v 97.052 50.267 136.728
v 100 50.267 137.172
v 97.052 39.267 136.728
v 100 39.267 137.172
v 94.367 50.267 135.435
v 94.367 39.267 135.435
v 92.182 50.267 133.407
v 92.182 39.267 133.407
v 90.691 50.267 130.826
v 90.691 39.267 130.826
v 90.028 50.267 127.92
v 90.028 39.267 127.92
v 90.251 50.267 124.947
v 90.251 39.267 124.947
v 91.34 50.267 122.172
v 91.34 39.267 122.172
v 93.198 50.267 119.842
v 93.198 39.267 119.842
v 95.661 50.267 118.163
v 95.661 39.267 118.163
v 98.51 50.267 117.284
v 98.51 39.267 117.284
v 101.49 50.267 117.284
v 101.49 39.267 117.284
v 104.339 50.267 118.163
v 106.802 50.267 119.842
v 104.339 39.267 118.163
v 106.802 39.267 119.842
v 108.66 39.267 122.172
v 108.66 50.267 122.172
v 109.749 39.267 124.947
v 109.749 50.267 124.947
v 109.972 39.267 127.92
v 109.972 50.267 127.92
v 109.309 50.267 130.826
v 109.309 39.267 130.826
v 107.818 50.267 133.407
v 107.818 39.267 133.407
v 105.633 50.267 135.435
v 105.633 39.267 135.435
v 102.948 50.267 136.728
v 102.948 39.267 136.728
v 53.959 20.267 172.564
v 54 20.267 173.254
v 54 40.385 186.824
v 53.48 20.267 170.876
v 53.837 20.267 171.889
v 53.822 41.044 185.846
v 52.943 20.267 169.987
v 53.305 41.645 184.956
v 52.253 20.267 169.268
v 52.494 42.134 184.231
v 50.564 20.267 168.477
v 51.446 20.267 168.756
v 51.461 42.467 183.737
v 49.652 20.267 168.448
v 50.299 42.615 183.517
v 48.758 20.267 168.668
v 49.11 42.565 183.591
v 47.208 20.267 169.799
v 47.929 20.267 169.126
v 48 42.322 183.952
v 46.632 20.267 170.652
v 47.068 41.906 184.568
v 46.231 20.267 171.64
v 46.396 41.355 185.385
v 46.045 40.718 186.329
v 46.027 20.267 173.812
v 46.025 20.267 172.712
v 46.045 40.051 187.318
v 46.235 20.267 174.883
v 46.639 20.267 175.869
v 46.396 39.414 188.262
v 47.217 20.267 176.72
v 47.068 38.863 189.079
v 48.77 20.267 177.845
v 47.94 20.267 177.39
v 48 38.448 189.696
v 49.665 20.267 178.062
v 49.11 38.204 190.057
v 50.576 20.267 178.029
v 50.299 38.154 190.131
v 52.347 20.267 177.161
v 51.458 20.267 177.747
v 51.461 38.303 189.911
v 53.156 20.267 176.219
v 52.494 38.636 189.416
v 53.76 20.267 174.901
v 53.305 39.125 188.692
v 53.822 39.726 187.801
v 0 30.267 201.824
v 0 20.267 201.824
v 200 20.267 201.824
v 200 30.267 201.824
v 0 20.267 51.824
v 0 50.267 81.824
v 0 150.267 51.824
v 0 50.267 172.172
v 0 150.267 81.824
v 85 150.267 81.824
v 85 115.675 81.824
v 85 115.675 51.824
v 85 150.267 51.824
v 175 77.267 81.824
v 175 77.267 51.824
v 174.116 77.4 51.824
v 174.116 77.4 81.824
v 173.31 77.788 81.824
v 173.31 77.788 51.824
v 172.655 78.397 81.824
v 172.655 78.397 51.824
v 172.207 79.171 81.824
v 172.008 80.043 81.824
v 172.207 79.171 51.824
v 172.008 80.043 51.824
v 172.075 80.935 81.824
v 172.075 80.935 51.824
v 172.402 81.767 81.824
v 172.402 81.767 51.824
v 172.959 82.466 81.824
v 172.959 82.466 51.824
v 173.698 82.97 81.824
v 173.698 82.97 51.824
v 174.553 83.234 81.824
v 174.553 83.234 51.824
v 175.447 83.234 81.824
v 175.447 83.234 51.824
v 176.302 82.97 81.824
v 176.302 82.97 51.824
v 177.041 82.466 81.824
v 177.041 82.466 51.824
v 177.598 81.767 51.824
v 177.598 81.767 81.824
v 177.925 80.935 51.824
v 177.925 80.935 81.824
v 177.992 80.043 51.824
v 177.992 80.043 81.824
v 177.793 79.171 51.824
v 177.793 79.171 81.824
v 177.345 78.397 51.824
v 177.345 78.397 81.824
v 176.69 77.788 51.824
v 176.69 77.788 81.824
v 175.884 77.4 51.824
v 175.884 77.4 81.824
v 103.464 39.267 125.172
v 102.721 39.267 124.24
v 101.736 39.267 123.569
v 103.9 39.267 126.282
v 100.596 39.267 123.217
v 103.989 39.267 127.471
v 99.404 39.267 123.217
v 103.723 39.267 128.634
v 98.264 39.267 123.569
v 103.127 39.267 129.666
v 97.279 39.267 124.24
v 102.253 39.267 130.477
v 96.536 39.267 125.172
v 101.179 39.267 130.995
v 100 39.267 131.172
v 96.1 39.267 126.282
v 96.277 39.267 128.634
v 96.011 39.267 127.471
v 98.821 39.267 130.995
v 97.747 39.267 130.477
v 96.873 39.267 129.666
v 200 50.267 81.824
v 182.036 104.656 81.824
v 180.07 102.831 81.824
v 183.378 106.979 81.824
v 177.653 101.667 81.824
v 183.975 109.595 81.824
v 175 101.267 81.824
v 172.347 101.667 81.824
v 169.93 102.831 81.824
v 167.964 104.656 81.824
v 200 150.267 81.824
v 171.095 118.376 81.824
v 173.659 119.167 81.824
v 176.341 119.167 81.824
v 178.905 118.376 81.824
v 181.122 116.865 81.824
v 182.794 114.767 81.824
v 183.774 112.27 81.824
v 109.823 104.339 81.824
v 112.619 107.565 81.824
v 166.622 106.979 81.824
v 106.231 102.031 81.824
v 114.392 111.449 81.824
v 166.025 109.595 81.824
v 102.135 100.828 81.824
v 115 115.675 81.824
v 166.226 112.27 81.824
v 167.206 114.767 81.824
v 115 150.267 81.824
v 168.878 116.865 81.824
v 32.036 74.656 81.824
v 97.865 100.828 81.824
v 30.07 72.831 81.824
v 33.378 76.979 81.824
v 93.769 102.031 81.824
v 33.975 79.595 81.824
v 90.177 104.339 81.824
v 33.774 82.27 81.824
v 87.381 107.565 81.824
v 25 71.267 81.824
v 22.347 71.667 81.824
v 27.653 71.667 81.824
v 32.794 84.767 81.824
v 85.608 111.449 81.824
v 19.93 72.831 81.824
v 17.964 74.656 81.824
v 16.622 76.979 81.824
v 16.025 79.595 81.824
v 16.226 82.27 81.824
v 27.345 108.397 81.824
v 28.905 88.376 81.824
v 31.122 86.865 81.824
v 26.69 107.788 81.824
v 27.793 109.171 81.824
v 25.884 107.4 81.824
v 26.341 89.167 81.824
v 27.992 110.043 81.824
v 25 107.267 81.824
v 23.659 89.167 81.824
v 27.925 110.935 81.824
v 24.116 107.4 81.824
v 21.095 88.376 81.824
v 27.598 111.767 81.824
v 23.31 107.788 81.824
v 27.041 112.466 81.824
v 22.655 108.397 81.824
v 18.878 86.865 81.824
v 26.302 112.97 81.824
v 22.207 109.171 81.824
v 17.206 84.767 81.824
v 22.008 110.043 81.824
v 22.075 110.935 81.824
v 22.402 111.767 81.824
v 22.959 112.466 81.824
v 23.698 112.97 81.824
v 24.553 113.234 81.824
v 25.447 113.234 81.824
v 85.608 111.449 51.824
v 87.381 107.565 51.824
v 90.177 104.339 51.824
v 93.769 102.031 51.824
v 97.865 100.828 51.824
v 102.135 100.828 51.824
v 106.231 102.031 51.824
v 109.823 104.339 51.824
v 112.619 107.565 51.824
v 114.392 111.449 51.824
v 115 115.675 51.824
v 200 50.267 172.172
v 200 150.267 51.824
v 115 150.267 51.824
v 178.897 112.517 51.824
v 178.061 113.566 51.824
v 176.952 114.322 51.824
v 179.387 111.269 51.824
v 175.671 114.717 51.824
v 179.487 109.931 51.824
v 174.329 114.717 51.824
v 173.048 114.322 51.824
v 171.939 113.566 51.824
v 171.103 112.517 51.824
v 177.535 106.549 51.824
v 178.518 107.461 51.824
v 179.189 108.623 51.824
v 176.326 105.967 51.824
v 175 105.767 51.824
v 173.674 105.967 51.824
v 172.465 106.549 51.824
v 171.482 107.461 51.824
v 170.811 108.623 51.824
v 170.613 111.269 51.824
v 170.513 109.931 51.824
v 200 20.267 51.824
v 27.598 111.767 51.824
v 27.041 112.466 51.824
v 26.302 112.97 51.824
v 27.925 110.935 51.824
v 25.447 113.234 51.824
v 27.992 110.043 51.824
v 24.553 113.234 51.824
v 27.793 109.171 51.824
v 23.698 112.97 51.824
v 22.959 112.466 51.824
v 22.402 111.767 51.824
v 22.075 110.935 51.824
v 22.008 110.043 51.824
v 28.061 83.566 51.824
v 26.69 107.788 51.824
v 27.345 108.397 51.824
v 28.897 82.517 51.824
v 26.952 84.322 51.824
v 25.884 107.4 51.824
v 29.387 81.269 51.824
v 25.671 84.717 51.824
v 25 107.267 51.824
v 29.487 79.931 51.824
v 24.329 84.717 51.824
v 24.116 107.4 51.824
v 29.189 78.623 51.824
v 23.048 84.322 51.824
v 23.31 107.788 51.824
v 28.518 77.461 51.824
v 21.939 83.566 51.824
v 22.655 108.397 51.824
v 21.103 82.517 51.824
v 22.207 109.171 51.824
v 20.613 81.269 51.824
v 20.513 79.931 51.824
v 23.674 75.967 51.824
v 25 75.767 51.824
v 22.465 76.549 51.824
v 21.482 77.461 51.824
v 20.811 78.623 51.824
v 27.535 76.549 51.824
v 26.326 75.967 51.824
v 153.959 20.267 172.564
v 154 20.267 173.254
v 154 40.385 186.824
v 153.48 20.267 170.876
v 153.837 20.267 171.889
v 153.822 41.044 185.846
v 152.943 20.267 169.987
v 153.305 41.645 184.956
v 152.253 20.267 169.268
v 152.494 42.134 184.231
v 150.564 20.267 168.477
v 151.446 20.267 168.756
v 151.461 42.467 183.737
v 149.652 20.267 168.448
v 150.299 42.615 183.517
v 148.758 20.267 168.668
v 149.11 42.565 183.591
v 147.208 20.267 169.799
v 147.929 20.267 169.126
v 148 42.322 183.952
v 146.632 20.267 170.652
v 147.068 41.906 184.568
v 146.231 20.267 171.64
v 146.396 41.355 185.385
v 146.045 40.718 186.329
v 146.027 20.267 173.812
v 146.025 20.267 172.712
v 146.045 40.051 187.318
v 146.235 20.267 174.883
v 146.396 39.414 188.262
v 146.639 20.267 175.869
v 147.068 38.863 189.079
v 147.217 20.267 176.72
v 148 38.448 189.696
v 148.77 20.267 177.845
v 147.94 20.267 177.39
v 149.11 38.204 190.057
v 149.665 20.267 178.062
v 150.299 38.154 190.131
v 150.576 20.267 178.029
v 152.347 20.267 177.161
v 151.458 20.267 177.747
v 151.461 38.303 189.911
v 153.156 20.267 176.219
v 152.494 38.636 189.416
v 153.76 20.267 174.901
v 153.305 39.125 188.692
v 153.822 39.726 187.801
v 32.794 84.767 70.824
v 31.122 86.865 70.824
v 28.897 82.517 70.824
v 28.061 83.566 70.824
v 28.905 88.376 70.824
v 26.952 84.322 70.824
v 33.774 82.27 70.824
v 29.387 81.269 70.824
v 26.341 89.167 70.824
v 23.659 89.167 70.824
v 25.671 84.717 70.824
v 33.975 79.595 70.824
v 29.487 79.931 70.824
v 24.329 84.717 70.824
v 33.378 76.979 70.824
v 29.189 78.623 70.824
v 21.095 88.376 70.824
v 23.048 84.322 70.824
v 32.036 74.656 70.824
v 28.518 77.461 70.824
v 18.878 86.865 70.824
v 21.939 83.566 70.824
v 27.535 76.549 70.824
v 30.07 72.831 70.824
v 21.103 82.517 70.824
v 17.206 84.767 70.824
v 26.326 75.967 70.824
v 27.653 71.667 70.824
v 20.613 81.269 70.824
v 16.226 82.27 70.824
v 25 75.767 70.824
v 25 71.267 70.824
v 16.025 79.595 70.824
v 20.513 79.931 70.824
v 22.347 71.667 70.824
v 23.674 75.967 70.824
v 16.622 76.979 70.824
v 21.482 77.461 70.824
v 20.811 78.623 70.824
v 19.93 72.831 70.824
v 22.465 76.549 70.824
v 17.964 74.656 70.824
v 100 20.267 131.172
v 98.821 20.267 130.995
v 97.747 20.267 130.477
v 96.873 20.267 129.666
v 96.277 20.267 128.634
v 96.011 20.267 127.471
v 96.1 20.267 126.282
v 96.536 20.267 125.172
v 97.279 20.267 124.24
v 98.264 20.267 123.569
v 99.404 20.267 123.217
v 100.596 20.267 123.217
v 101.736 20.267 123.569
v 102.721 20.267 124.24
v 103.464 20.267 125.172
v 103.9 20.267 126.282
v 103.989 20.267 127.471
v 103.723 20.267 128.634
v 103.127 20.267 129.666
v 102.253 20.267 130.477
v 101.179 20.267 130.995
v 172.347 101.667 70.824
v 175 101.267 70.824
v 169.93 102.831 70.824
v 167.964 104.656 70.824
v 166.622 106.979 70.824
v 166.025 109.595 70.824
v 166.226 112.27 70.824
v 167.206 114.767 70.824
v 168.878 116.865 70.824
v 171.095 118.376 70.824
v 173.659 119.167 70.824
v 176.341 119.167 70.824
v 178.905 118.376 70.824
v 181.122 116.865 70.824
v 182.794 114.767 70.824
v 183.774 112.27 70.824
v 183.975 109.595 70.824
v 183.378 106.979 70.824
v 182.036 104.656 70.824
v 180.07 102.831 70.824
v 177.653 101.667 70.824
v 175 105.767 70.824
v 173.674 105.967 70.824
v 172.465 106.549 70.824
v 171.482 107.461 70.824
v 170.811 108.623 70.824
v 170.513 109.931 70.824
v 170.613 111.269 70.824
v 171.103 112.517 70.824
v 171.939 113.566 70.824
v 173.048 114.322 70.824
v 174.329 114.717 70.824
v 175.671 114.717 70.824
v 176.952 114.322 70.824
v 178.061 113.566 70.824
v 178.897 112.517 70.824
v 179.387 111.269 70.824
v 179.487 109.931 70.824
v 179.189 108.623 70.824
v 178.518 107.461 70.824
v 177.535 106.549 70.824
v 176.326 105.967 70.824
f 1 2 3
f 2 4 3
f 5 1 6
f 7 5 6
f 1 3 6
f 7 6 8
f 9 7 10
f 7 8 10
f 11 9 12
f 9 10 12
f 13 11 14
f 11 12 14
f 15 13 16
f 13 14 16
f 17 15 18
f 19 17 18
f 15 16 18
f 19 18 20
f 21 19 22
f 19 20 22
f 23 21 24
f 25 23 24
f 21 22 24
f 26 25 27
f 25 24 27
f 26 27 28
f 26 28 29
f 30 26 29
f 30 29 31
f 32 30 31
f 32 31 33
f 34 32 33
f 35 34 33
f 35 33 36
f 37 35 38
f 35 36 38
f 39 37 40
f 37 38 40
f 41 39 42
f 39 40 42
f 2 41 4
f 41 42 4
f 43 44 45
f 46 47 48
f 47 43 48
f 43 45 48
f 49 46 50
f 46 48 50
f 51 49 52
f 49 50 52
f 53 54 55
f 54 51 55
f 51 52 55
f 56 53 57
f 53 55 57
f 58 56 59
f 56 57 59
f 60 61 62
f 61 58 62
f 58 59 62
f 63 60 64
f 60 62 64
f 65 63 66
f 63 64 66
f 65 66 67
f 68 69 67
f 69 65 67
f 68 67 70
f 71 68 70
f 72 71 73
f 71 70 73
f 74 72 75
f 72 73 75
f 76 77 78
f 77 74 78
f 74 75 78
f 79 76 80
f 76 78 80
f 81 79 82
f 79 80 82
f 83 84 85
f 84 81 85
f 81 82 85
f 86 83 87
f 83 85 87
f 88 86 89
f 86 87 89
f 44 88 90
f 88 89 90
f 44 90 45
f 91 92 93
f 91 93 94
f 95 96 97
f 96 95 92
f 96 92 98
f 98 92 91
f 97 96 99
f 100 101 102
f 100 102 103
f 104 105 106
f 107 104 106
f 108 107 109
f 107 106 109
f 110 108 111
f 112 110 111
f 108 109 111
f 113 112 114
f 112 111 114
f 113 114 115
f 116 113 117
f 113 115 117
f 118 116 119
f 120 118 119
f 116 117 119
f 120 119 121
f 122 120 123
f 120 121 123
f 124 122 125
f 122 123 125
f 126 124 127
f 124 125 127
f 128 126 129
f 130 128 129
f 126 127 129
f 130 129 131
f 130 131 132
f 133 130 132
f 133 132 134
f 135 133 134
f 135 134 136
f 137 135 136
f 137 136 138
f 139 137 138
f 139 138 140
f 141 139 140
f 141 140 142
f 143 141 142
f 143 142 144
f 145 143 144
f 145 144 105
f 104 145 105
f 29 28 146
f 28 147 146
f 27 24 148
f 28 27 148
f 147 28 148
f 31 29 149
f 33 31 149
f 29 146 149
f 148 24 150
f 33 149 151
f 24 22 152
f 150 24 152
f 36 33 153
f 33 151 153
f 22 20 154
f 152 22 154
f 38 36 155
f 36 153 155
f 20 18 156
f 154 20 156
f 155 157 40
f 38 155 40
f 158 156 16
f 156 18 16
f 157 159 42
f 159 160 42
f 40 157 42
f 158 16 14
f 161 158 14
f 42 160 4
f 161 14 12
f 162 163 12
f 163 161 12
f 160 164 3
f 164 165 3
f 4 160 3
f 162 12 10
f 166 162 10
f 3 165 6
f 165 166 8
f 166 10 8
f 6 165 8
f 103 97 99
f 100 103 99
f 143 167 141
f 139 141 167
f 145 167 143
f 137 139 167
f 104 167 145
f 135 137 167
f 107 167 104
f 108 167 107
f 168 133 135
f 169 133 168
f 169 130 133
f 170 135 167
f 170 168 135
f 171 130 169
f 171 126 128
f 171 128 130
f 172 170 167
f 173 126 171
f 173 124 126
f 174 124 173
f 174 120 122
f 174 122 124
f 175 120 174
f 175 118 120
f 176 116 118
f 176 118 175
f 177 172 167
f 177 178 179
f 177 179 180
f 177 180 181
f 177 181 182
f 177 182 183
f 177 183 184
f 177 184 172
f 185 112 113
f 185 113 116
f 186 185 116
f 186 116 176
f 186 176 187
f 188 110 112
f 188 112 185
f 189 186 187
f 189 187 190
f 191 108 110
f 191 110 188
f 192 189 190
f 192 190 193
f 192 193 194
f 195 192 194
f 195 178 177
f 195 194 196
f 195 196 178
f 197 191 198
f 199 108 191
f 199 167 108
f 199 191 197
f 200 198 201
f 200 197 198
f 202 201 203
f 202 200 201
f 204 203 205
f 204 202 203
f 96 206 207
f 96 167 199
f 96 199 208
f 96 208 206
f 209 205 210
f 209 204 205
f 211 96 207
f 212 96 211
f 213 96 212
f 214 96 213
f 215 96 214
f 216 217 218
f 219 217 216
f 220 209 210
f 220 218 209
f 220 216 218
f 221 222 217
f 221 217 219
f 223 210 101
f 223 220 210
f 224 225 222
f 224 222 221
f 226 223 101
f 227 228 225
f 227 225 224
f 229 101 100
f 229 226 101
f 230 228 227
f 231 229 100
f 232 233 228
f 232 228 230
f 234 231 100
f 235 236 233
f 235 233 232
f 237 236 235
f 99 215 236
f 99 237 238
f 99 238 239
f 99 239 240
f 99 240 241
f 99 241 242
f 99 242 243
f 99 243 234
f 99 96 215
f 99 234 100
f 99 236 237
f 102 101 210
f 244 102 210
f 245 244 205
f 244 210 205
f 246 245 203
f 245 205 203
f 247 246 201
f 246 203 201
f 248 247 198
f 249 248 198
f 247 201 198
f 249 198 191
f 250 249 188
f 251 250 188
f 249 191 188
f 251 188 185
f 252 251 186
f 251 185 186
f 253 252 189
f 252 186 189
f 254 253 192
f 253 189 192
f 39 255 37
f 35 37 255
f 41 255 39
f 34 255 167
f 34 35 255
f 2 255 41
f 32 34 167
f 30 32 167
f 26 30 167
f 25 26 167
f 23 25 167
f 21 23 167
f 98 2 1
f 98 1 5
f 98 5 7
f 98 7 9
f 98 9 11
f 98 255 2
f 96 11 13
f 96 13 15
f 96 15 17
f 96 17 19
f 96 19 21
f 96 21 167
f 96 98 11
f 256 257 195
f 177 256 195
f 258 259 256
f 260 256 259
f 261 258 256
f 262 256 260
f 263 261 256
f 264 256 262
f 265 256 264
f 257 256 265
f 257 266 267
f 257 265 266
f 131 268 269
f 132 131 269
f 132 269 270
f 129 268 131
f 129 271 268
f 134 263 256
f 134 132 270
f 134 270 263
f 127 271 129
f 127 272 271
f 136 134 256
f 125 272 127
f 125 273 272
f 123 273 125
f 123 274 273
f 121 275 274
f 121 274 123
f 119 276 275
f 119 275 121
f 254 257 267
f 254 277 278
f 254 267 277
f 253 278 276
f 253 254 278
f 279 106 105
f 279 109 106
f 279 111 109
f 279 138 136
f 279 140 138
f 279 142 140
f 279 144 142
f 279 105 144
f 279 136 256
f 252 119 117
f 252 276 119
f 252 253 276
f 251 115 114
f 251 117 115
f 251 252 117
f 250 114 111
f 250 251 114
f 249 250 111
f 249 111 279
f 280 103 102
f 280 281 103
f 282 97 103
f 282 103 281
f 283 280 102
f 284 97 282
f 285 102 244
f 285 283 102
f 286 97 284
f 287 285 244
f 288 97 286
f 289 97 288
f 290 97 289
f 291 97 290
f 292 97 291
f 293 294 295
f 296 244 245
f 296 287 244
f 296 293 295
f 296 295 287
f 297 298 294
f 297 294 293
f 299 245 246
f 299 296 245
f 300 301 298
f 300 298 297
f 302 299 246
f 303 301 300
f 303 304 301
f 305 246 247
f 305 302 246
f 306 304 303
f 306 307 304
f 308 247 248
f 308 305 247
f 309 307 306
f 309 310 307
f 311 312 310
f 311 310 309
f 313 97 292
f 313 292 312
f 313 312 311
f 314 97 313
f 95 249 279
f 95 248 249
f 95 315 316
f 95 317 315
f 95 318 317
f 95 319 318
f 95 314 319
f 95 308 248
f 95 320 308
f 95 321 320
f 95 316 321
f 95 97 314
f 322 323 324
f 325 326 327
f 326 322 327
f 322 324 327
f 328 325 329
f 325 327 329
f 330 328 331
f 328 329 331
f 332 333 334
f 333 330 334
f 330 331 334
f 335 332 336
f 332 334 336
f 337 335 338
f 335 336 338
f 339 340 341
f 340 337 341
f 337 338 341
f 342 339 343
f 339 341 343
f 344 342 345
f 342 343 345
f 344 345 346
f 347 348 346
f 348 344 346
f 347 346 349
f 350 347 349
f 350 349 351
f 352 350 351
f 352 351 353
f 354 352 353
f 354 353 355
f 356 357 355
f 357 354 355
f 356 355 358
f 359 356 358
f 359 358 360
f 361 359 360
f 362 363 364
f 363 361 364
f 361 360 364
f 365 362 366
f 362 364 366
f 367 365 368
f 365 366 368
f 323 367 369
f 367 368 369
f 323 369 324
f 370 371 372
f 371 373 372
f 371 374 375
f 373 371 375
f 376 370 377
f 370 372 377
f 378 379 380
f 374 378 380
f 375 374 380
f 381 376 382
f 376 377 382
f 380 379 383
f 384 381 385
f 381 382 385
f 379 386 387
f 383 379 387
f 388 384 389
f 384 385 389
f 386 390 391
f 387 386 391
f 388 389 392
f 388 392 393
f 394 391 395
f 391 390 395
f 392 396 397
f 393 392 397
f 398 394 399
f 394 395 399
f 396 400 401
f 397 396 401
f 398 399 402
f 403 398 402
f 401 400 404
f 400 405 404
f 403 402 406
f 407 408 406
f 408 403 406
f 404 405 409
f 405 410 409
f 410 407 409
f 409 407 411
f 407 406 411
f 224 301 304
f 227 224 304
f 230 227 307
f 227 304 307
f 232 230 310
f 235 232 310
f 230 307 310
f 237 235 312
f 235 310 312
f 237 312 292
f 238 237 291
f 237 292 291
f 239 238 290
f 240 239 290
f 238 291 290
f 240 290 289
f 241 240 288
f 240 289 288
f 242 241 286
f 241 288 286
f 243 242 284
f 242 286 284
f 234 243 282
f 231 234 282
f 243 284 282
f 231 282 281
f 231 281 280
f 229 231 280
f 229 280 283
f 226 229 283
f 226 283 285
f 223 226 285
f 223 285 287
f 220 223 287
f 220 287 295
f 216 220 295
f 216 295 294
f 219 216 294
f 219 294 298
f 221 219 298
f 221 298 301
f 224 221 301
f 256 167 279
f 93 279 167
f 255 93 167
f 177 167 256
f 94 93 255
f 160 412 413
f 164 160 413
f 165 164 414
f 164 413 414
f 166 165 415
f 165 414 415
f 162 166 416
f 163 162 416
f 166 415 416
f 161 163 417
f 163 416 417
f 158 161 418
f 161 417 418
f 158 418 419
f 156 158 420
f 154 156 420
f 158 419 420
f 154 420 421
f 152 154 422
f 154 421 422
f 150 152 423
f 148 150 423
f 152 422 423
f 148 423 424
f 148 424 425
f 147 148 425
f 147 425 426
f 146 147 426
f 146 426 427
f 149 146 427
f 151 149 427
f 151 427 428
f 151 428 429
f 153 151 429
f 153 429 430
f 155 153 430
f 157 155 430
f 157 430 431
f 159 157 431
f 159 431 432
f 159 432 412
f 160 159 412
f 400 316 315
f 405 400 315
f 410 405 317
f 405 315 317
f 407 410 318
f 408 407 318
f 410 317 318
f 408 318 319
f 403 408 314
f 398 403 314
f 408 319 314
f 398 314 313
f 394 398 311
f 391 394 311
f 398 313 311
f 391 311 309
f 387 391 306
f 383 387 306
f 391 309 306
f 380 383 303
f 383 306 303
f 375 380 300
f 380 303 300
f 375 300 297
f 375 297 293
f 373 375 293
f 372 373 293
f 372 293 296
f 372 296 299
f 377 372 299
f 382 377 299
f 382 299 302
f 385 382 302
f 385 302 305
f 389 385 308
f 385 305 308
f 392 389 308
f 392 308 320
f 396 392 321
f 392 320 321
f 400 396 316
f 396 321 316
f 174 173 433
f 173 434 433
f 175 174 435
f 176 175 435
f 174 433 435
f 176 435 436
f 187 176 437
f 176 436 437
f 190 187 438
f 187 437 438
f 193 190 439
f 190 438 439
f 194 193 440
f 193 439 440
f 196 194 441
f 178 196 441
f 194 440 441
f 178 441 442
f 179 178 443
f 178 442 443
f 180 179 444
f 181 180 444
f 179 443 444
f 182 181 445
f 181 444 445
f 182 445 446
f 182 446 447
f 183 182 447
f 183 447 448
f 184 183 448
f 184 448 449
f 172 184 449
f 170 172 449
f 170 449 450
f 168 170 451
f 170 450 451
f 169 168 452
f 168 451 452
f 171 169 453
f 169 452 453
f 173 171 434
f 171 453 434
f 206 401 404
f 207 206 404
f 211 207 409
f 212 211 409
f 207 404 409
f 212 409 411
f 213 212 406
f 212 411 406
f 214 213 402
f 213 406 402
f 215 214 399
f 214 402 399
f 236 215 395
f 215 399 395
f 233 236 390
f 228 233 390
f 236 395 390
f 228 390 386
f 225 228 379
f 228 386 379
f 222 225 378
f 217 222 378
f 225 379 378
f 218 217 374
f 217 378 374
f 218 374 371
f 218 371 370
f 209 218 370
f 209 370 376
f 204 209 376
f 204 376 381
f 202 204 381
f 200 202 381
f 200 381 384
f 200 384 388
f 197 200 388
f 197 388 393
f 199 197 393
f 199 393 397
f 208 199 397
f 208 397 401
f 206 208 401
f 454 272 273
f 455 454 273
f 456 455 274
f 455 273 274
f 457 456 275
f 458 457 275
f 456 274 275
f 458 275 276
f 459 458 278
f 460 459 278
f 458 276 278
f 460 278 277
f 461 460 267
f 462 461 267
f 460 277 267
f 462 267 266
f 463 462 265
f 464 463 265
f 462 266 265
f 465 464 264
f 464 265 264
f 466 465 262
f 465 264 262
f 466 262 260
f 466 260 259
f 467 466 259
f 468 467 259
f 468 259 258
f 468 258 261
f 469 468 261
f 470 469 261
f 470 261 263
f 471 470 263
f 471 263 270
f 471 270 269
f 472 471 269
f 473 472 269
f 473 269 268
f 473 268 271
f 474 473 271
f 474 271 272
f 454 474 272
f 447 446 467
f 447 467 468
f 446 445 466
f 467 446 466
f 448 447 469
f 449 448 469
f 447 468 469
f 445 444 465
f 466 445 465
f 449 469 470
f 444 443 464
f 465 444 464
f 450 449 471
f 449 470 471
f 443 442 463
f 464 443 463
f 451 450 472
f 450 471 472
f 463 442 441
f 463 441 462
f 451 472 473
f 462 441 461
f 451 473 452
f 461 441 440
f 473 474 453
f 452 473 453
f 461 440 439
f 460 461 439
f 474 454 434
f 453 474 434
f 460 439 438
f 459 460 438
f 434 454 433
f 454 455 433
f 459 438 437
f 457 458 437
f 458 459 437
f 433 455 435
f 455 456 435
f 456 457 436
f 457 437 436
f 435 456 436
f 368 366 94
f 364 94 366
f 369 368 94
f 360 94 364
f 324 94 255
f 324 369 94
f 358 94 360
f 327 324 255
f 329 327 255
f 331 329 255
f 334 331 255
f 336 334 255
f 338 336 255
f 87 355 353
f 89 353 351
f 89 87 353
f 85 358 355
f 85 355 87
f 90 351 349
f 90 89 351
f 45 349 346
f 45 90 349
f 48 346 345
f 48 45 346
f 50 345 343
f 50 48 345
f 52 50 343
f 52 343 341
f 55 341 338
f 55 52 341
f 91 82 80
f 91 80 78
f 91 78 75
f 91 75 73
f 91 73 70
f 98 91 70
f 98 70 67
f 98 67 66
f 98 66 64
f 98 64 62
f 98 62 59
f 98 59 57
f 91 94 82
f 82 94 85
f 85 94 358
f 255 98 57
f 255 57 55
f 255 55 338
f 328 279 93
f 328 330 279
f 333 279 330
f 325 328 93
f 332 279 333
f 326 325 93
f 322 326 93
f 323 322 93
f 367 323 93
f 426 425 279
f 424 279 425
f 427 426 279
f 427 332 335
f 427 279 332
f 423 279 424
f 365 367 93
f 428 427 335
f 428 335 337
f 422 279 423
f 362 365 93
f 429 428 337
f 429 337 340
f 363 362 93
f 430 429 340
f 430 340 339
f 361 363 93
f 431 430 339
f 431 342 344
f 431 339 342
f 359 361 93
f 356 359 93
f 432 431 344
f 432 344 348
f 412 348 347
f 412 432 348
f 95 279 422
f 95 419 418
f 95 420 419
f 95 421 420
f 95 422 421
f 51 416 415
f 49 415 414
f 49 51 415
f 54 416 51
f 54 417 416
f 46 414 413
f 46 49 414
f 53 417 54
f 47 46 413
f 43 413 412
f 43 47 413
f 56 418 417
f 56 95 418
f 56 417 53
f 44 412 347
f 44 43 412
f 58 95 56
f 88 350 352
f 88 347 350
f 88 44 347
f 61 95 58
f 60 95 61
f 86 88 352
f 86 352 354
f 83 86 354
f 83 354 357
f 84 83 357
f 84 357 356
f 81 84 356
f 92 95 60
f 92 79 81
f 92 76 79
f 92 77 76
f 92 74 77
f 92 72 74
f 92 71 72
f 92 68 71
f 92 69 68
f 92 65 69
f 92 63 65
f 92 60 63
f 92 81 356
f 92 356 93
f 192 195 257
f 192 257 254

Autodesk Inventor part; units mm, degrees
ref_plane "YZ Plane" through (0, 0, 0) normal (1, 0, 0) x (0, 1, 0)
ref_plane "XZ Plane" through (0, 0, 0) normal (0, 1, 0) x (-1, 0, 0)
sketch "Sketch1" plane through (0, 0, 0) normal (1, 0, 0) x (0, 1, 0)
  line L0 (150.2672, 51.8236) -> (150.2672, 81.8236)
  line L1 (150.2672, 51.8236) -> (20.2672, 51.8236)
  line L2 (20.2672, 51.8236) -> (20.2672, 201.8236)
  line L3 (20.2672, 201.8236) -> (30.2672, 201.8236)
  line L4 (30.2672, 201.8236) -> (50.2672, 172.1724)
  line L5 (50.2672, 172.1724) -> (50.2672, 81.8236)
  line L6 (50.2672, 81.8236) -> (150.2672, 81.8236)
  dimension "d1" = 30
  dimension "d2" = 130
  dimension "d3" = 150
  dimension "d4" = 56
  dimension "d5" = 20
  dimension "d6" = 30
extrude "Extrusion1" add sketch "Sketch1" along normal blind 200
ref_plane "Work Plane1" through (0, 20.2672, 186.8236) normal (0, 0, -1) x (-1, 0, 0)
sketch "Sketch2" plane through (0, 50.2672, 172.1724) normal (0, 0.829, 0.5592) x (1, 0, 0)
  line L0 (200, -35.7658) -> (200, 0) projected
  circle A0 centre (150, -17.6726) radius 4
  circle A1 centre (50, -17.6726) radius 4
  line L1 (-20, -17.6726) -> (260, -17.6726) projected
  dimension "d10" = 8
  dimension "d11" = 50
  dimension "d12" = 100
extrude "Extrusion2" cut sketch "Sketch2" against normal up to next
sketch "Sketch3" plane through (0, 50.2672, 81.8236) normal (0, 0, 1) x (1, 0, 0)
  line L0 (200, 0) -> (200, 100) projected
  line L1 (0, 100) -> (200, 100) projected
  line L2 (0, 100) -> (0, 0) projected
  line L3 (85, 100) -> (115, 100)
  line L4 (115, 100) -> (115, 65.4079)
  line L5 (85, 65.4079) -> (85, 100)
  arc A0 (85, 65.4079) -> (115, 65.4079) centre (100, 65.4079) ccw
  dimension "d15" = 30
  dimension "d16" = 100
extrude "Extrusion3" cut sketch "Sketch3" against normal up to next
hole "Hole1" at (175, 80.2672, 81.8236) direction (0, 0, -1) diameter 6 depth 85 tip angle 118
hole "Hole2" at (175, 110.2672, 81.8236) direction (0, 0, -1) diameter 9 depth 30 tip angle 118 counterbore diameter 18 counterbore depth 11
hole "Hole3" at (25, 80.2672, 81.8236) direction (0, 0, -1) diameter 9 depth 30 tip angle 118 counterbore diameter 18 counterbore depth 11
hole "Hole4" at (25, 110.2672, 81.8236) direction (0, 0, -1) diameter 6 depth 30 tip angle 118
hole "Hole5" at (100, 50.2672, 127.1724) direction (0, -1, 0) diameter 8 depth 30 tip angle 118 counterbore diameter 20 counterbore depth 11
properties part number "bracket"
